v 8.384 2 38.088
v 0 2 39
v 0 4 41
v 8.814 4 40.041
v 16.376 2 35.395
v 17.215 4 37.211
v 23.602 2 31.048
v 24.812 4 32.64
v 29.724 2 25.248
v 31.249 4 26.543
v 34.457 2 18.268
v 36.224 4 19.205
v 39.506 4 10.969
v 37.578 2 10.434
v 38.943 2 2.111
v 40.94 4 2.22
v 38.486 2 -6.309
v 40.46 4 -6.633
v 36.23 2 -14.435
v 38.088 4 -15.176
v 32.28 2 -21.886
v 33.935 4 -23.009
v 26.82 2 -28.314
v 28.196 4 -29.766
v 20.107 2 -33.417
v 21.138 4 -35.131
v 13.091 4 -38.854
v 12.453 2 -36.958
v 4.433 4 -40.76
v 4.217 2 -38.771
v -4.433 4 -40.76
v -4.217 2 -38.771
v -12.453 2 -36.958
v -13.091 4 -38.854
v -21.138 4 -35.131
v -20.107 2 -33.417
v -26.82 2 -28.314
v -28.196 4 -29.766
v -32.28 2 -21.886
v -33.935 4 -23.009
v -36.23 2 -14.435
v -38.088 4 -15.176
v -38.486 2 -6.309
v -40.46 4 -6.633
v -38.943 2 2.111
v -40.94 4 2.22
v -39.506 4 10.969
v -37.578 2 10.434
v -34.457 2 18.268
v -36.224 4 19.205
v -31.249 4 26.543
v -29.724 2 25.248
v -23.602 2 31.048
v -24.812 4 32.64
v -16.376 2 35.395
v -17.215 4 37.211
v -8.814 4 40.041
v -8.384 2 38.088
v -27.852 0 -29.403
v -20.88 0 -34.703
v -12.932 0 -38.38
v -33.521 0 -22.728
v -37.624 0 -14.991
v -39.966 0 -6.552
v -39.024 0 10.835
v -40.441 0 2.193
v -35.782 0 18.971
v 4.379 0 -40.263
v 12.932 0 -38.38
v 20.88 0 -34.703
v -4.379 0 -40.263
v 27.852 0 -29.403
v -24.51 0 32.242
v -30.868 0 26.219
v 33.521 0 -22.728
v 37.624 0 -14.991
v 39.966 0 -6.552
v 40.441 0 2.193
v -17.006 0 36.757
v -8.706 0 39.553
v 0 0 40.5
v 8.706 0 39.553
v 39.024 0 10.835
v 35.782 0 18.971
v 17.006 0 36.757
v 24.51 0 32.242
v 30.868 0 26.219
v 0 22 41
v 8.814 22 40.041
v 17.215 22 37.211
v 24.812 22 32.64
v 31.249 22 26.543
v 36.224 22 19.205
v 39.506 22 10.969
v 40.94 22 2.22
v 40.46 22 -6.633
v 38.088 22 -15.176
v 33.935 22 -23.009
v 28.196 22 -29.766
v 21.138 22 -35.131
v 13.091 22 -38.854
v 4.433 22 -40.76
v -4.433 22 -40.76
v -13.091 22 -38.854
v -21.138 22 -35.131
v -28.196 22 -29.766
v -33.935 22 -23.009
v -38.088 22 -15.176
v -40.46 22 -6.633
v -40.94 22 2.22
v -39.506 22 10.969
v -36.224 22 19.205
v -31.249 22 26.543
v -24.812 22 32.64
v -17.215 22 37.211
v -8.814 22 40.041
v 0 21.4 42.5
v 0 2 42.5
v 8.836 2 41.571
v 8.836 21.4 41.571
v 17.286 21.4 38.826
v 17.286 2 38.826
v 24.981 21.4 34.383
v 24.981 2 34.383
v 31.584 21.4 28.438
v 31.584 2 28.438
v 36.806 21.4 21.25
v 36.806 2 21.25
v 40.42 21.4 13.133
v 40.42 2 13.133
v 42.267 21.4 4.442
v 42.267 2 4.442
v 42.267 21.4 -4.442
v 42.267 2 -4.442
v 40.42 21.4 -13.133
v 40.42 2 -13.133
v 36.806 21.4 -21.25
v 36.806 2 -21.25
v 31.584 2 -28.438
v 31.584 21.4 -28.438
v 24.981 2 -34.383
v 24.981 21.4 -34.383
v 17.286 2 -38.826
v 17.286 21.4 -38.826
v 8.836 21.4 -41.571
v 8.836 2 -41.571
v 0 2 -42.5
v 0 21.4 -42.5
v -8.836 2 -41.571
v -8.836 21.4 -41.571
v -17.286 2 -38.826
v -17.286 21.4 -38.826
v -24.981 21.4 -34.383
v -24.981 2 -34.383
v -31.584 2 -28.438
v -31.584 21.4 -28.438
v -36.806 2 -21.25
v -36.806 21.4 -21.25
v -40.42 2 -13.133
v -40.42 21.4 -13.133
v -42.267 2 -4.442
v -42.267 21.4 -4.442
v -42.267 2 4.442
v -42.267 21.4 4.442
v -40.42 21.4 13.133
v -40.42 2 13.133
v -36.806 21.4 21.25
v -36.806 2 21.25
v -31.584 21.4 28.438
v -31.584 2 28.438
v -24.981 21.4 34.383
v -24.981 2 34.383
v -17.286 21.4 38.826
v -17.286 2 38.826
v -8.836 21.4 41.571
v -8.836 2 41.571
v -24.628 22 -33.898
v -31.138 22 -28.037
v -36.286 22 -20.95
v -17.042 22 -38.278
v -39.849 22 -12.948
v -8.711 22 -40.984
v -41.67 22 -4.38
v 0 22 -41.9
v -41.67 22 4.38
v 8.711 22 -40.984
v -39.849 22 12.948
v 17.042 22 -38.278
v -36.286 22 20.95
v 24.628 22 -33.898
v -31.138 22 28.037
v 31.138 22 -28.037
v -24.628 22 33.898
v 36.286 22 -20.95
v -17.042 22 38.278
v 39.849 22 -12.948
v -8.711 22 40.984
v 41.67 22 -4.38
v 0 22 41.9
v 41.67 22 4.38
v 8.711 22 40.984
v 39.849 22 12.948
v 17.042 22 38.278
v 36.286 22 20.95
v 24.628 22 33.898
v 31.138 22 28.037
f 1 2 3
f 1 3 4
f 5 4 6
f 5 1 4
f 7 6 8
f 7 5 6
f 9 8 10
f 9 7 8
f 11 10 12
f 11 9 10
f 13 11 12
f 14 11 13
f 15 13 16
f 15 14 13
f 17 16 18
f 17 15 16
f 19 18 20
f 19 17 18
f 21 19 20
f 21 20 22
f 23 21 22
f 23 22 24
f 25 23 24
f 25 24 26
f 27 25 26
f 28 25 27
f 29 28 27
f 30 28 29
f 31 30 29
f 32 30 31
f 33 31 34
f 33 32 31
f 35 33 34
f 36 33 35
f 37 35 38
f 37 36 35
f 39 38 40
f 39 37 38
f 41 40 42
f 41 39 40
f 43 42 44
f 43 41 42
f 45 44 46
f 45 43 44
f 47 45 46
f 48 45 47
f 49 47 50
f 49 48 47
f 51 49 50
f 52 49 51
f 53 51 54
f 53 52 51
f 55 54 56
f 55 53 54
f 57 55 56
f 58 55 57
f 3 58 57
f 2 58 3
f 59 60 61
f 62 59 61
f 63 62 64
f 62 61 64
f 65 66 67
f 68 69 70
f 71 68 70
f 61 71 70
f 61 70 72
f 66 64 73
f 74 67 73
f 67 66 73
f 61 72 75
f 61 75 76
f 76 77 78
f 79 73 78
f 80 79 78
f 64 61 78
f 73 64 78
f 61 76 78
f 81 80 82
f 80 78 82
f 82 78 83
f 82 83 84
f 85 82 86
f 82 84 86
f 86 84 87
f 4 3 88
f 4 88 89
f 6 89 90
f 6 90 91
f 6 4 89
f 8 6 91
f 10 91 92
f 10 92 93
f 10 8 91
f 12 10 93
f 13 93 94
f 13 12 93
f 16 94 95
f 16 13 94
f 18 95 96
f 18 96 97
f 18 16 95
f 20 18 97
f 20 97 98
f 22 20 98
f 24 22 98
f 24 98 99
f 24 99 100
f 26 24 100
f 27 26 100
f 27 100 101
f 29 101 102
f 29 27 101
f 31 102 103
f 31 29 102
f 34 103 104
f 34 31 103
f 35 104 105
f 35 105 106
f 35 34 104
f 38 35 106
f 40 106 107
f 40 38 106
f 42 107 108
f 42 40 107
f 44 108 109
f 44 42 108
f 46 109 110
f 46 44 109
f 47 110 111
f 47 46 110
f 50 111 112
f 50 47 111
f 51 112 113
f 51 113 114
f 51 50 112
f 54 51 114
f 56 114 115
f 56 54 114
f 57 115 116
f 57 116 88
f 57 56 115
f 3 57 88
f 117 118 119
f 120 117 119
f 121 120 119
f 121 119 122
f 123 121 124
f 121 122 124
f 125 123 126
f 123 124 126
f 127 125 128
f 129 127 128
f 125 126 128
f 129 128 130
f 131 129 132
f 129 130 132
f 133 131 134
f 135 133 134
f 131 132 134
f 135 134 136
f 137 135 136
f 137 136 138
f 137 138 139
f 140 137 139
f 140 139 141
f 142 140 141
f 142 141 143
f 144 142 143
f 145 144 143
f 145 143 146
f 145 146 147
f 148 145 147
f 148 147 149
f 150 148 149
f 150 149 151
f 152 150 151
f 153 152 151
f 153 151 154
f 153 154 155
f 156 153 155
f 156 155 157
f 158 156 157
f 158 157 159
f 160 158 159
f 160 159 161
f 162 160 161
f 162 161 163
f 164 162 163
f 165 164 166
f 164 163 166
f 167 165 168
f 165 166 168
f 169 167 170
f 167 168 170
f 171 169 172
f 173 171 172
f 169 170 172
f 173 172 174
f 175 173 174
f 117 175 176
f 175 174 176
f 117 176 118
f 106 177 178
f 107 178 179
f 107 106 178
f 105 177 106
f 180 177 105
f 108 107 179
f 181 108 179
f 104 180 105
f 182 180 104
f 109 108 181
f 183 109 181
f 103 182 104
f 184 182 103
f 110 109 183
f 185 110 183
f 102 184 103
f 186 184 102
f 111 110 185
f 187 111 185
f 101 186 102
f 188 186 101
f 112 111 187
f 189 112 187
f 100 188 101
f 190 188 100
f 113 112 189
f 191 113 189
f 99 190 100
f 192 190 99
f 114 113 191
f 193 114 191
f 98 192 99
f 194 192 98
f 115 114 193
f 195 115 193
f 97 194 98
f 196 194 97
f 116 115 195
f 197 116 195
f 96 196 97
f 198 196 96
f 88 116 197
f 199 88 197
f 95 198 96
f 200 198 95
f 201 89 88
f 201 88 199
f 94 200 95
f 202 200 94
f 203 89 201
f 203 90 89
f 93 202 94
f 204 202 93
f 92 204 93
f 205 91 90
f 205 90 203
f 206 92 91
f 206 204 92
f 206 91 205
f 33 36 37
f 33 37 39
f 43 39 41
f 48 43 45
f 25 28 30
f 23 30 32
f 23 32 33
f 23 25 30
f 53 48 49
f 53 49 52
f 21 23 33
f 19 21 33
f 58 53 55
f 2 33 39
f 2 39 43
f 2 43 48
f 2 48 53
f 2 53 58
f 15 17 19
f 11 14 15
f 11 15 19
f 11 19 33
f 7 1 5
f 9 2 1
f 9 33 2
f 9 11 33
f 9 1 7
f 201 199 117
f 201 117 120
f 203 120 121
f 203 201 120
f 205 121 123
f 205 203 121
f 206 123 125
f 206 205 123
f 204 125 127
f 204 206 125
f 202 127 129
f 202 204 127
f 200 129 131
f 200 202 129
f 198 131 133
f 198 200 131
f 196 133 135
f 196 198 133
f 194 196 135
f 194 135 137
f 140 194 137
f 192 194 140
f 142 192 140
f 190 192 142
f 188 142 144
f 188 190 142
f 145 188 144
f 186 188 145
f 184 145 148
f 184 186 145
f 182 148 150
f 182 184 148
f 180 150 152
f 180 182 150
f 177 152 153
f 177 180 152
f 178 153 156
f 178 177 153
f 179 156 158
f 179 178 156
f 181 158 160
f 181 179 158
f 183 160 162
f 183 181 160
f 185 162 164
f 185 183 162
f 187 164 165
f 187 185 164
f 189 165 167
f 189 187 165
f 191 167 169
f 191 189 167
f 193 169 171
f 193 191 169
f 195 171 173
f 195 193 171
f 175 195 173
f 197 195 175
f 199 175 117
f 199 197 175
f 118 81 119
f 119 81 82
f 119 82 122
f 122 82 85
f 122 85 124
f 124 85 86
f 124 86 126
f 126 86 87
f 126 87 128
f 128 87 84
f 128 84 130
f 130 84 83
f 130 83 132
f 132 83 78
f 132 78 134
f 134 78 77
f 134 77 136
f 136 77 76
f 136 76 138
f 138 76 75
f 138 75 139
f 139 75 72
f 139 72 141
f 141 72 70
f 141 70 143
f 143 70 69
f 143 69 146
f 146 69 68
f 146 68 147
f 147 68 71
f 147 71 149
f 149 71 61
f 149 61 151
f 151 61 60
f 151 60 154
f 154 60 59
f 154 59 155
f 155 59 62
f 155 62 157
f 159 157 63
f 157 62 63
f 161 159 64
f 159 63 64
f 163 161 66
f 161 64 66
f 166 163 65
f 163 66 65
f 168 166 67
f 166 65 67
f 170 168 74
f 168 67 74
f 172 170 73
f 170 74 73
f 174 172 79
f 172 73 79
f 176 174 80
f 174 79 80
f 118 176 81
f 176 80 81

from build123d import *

# Parameters (mm, degrees)
SKETCH1_R           = 42.5
BOSS_EXTRUDE1_DEPTH = 2
SKETCH2_R           = 42.5
SKETCH2_R_2         = 41
BOSS_EXTRUDE2_DEPTH = 20
CHAMFER1_SIZE       = 2
CHAMFER2_SIZE       = 0.6


with BuildPart() as part:
    # Sketch1 → Boss-Extrude1 (new body)
    with BuildSketch(Plane(origin=(0, 0, 0), x_dir=(1, 0, 0), z_dir=(0, 1, 0))):
        with Locations(Location((0, 0, 0), (0, 0, 270))):
            Circle(SKETCH1_R)
    extrude(amount=BOSS_EXTRUDE1_DEPTH)

    # Sketch2 → Boss-Extrude2 (add)
    with BuildSketch(Plane(origin=(0, 2, 0), x_dir=(1, 0, 0), z_dir=(0, 1, 0))):
        with Locations(Location((0, 0, 0), (0, 0, 270))):
            Circle(SKETCH2_R)
        with Locations(Location((0, 0, 0), (0, 0, 270))):
            Circle(SKETCH2_R_2, mode=Mode.SUBTRACT)
    extrude(amount=BOSS_EXTRUDE2_DEPTH)

    # Chamfer1
    chamfer1_edges = [part.edges().sort_by_distance(p)[0] for p in [
        (0, 0, -42.5),
        (0, 2, -41),
    ]]
    chamfer(chamfer1_edges, length=CHAMFER1_SIZE)

    # Chamfer2
    chamfer2_edges = [part.edges().sort_by_distance(p)[0] for p in [
        (0, 22, -42.5),
    ]]
    chamfer(chamfer2_edges, length=CHAMFER2_SIZE)


solid = part.part
